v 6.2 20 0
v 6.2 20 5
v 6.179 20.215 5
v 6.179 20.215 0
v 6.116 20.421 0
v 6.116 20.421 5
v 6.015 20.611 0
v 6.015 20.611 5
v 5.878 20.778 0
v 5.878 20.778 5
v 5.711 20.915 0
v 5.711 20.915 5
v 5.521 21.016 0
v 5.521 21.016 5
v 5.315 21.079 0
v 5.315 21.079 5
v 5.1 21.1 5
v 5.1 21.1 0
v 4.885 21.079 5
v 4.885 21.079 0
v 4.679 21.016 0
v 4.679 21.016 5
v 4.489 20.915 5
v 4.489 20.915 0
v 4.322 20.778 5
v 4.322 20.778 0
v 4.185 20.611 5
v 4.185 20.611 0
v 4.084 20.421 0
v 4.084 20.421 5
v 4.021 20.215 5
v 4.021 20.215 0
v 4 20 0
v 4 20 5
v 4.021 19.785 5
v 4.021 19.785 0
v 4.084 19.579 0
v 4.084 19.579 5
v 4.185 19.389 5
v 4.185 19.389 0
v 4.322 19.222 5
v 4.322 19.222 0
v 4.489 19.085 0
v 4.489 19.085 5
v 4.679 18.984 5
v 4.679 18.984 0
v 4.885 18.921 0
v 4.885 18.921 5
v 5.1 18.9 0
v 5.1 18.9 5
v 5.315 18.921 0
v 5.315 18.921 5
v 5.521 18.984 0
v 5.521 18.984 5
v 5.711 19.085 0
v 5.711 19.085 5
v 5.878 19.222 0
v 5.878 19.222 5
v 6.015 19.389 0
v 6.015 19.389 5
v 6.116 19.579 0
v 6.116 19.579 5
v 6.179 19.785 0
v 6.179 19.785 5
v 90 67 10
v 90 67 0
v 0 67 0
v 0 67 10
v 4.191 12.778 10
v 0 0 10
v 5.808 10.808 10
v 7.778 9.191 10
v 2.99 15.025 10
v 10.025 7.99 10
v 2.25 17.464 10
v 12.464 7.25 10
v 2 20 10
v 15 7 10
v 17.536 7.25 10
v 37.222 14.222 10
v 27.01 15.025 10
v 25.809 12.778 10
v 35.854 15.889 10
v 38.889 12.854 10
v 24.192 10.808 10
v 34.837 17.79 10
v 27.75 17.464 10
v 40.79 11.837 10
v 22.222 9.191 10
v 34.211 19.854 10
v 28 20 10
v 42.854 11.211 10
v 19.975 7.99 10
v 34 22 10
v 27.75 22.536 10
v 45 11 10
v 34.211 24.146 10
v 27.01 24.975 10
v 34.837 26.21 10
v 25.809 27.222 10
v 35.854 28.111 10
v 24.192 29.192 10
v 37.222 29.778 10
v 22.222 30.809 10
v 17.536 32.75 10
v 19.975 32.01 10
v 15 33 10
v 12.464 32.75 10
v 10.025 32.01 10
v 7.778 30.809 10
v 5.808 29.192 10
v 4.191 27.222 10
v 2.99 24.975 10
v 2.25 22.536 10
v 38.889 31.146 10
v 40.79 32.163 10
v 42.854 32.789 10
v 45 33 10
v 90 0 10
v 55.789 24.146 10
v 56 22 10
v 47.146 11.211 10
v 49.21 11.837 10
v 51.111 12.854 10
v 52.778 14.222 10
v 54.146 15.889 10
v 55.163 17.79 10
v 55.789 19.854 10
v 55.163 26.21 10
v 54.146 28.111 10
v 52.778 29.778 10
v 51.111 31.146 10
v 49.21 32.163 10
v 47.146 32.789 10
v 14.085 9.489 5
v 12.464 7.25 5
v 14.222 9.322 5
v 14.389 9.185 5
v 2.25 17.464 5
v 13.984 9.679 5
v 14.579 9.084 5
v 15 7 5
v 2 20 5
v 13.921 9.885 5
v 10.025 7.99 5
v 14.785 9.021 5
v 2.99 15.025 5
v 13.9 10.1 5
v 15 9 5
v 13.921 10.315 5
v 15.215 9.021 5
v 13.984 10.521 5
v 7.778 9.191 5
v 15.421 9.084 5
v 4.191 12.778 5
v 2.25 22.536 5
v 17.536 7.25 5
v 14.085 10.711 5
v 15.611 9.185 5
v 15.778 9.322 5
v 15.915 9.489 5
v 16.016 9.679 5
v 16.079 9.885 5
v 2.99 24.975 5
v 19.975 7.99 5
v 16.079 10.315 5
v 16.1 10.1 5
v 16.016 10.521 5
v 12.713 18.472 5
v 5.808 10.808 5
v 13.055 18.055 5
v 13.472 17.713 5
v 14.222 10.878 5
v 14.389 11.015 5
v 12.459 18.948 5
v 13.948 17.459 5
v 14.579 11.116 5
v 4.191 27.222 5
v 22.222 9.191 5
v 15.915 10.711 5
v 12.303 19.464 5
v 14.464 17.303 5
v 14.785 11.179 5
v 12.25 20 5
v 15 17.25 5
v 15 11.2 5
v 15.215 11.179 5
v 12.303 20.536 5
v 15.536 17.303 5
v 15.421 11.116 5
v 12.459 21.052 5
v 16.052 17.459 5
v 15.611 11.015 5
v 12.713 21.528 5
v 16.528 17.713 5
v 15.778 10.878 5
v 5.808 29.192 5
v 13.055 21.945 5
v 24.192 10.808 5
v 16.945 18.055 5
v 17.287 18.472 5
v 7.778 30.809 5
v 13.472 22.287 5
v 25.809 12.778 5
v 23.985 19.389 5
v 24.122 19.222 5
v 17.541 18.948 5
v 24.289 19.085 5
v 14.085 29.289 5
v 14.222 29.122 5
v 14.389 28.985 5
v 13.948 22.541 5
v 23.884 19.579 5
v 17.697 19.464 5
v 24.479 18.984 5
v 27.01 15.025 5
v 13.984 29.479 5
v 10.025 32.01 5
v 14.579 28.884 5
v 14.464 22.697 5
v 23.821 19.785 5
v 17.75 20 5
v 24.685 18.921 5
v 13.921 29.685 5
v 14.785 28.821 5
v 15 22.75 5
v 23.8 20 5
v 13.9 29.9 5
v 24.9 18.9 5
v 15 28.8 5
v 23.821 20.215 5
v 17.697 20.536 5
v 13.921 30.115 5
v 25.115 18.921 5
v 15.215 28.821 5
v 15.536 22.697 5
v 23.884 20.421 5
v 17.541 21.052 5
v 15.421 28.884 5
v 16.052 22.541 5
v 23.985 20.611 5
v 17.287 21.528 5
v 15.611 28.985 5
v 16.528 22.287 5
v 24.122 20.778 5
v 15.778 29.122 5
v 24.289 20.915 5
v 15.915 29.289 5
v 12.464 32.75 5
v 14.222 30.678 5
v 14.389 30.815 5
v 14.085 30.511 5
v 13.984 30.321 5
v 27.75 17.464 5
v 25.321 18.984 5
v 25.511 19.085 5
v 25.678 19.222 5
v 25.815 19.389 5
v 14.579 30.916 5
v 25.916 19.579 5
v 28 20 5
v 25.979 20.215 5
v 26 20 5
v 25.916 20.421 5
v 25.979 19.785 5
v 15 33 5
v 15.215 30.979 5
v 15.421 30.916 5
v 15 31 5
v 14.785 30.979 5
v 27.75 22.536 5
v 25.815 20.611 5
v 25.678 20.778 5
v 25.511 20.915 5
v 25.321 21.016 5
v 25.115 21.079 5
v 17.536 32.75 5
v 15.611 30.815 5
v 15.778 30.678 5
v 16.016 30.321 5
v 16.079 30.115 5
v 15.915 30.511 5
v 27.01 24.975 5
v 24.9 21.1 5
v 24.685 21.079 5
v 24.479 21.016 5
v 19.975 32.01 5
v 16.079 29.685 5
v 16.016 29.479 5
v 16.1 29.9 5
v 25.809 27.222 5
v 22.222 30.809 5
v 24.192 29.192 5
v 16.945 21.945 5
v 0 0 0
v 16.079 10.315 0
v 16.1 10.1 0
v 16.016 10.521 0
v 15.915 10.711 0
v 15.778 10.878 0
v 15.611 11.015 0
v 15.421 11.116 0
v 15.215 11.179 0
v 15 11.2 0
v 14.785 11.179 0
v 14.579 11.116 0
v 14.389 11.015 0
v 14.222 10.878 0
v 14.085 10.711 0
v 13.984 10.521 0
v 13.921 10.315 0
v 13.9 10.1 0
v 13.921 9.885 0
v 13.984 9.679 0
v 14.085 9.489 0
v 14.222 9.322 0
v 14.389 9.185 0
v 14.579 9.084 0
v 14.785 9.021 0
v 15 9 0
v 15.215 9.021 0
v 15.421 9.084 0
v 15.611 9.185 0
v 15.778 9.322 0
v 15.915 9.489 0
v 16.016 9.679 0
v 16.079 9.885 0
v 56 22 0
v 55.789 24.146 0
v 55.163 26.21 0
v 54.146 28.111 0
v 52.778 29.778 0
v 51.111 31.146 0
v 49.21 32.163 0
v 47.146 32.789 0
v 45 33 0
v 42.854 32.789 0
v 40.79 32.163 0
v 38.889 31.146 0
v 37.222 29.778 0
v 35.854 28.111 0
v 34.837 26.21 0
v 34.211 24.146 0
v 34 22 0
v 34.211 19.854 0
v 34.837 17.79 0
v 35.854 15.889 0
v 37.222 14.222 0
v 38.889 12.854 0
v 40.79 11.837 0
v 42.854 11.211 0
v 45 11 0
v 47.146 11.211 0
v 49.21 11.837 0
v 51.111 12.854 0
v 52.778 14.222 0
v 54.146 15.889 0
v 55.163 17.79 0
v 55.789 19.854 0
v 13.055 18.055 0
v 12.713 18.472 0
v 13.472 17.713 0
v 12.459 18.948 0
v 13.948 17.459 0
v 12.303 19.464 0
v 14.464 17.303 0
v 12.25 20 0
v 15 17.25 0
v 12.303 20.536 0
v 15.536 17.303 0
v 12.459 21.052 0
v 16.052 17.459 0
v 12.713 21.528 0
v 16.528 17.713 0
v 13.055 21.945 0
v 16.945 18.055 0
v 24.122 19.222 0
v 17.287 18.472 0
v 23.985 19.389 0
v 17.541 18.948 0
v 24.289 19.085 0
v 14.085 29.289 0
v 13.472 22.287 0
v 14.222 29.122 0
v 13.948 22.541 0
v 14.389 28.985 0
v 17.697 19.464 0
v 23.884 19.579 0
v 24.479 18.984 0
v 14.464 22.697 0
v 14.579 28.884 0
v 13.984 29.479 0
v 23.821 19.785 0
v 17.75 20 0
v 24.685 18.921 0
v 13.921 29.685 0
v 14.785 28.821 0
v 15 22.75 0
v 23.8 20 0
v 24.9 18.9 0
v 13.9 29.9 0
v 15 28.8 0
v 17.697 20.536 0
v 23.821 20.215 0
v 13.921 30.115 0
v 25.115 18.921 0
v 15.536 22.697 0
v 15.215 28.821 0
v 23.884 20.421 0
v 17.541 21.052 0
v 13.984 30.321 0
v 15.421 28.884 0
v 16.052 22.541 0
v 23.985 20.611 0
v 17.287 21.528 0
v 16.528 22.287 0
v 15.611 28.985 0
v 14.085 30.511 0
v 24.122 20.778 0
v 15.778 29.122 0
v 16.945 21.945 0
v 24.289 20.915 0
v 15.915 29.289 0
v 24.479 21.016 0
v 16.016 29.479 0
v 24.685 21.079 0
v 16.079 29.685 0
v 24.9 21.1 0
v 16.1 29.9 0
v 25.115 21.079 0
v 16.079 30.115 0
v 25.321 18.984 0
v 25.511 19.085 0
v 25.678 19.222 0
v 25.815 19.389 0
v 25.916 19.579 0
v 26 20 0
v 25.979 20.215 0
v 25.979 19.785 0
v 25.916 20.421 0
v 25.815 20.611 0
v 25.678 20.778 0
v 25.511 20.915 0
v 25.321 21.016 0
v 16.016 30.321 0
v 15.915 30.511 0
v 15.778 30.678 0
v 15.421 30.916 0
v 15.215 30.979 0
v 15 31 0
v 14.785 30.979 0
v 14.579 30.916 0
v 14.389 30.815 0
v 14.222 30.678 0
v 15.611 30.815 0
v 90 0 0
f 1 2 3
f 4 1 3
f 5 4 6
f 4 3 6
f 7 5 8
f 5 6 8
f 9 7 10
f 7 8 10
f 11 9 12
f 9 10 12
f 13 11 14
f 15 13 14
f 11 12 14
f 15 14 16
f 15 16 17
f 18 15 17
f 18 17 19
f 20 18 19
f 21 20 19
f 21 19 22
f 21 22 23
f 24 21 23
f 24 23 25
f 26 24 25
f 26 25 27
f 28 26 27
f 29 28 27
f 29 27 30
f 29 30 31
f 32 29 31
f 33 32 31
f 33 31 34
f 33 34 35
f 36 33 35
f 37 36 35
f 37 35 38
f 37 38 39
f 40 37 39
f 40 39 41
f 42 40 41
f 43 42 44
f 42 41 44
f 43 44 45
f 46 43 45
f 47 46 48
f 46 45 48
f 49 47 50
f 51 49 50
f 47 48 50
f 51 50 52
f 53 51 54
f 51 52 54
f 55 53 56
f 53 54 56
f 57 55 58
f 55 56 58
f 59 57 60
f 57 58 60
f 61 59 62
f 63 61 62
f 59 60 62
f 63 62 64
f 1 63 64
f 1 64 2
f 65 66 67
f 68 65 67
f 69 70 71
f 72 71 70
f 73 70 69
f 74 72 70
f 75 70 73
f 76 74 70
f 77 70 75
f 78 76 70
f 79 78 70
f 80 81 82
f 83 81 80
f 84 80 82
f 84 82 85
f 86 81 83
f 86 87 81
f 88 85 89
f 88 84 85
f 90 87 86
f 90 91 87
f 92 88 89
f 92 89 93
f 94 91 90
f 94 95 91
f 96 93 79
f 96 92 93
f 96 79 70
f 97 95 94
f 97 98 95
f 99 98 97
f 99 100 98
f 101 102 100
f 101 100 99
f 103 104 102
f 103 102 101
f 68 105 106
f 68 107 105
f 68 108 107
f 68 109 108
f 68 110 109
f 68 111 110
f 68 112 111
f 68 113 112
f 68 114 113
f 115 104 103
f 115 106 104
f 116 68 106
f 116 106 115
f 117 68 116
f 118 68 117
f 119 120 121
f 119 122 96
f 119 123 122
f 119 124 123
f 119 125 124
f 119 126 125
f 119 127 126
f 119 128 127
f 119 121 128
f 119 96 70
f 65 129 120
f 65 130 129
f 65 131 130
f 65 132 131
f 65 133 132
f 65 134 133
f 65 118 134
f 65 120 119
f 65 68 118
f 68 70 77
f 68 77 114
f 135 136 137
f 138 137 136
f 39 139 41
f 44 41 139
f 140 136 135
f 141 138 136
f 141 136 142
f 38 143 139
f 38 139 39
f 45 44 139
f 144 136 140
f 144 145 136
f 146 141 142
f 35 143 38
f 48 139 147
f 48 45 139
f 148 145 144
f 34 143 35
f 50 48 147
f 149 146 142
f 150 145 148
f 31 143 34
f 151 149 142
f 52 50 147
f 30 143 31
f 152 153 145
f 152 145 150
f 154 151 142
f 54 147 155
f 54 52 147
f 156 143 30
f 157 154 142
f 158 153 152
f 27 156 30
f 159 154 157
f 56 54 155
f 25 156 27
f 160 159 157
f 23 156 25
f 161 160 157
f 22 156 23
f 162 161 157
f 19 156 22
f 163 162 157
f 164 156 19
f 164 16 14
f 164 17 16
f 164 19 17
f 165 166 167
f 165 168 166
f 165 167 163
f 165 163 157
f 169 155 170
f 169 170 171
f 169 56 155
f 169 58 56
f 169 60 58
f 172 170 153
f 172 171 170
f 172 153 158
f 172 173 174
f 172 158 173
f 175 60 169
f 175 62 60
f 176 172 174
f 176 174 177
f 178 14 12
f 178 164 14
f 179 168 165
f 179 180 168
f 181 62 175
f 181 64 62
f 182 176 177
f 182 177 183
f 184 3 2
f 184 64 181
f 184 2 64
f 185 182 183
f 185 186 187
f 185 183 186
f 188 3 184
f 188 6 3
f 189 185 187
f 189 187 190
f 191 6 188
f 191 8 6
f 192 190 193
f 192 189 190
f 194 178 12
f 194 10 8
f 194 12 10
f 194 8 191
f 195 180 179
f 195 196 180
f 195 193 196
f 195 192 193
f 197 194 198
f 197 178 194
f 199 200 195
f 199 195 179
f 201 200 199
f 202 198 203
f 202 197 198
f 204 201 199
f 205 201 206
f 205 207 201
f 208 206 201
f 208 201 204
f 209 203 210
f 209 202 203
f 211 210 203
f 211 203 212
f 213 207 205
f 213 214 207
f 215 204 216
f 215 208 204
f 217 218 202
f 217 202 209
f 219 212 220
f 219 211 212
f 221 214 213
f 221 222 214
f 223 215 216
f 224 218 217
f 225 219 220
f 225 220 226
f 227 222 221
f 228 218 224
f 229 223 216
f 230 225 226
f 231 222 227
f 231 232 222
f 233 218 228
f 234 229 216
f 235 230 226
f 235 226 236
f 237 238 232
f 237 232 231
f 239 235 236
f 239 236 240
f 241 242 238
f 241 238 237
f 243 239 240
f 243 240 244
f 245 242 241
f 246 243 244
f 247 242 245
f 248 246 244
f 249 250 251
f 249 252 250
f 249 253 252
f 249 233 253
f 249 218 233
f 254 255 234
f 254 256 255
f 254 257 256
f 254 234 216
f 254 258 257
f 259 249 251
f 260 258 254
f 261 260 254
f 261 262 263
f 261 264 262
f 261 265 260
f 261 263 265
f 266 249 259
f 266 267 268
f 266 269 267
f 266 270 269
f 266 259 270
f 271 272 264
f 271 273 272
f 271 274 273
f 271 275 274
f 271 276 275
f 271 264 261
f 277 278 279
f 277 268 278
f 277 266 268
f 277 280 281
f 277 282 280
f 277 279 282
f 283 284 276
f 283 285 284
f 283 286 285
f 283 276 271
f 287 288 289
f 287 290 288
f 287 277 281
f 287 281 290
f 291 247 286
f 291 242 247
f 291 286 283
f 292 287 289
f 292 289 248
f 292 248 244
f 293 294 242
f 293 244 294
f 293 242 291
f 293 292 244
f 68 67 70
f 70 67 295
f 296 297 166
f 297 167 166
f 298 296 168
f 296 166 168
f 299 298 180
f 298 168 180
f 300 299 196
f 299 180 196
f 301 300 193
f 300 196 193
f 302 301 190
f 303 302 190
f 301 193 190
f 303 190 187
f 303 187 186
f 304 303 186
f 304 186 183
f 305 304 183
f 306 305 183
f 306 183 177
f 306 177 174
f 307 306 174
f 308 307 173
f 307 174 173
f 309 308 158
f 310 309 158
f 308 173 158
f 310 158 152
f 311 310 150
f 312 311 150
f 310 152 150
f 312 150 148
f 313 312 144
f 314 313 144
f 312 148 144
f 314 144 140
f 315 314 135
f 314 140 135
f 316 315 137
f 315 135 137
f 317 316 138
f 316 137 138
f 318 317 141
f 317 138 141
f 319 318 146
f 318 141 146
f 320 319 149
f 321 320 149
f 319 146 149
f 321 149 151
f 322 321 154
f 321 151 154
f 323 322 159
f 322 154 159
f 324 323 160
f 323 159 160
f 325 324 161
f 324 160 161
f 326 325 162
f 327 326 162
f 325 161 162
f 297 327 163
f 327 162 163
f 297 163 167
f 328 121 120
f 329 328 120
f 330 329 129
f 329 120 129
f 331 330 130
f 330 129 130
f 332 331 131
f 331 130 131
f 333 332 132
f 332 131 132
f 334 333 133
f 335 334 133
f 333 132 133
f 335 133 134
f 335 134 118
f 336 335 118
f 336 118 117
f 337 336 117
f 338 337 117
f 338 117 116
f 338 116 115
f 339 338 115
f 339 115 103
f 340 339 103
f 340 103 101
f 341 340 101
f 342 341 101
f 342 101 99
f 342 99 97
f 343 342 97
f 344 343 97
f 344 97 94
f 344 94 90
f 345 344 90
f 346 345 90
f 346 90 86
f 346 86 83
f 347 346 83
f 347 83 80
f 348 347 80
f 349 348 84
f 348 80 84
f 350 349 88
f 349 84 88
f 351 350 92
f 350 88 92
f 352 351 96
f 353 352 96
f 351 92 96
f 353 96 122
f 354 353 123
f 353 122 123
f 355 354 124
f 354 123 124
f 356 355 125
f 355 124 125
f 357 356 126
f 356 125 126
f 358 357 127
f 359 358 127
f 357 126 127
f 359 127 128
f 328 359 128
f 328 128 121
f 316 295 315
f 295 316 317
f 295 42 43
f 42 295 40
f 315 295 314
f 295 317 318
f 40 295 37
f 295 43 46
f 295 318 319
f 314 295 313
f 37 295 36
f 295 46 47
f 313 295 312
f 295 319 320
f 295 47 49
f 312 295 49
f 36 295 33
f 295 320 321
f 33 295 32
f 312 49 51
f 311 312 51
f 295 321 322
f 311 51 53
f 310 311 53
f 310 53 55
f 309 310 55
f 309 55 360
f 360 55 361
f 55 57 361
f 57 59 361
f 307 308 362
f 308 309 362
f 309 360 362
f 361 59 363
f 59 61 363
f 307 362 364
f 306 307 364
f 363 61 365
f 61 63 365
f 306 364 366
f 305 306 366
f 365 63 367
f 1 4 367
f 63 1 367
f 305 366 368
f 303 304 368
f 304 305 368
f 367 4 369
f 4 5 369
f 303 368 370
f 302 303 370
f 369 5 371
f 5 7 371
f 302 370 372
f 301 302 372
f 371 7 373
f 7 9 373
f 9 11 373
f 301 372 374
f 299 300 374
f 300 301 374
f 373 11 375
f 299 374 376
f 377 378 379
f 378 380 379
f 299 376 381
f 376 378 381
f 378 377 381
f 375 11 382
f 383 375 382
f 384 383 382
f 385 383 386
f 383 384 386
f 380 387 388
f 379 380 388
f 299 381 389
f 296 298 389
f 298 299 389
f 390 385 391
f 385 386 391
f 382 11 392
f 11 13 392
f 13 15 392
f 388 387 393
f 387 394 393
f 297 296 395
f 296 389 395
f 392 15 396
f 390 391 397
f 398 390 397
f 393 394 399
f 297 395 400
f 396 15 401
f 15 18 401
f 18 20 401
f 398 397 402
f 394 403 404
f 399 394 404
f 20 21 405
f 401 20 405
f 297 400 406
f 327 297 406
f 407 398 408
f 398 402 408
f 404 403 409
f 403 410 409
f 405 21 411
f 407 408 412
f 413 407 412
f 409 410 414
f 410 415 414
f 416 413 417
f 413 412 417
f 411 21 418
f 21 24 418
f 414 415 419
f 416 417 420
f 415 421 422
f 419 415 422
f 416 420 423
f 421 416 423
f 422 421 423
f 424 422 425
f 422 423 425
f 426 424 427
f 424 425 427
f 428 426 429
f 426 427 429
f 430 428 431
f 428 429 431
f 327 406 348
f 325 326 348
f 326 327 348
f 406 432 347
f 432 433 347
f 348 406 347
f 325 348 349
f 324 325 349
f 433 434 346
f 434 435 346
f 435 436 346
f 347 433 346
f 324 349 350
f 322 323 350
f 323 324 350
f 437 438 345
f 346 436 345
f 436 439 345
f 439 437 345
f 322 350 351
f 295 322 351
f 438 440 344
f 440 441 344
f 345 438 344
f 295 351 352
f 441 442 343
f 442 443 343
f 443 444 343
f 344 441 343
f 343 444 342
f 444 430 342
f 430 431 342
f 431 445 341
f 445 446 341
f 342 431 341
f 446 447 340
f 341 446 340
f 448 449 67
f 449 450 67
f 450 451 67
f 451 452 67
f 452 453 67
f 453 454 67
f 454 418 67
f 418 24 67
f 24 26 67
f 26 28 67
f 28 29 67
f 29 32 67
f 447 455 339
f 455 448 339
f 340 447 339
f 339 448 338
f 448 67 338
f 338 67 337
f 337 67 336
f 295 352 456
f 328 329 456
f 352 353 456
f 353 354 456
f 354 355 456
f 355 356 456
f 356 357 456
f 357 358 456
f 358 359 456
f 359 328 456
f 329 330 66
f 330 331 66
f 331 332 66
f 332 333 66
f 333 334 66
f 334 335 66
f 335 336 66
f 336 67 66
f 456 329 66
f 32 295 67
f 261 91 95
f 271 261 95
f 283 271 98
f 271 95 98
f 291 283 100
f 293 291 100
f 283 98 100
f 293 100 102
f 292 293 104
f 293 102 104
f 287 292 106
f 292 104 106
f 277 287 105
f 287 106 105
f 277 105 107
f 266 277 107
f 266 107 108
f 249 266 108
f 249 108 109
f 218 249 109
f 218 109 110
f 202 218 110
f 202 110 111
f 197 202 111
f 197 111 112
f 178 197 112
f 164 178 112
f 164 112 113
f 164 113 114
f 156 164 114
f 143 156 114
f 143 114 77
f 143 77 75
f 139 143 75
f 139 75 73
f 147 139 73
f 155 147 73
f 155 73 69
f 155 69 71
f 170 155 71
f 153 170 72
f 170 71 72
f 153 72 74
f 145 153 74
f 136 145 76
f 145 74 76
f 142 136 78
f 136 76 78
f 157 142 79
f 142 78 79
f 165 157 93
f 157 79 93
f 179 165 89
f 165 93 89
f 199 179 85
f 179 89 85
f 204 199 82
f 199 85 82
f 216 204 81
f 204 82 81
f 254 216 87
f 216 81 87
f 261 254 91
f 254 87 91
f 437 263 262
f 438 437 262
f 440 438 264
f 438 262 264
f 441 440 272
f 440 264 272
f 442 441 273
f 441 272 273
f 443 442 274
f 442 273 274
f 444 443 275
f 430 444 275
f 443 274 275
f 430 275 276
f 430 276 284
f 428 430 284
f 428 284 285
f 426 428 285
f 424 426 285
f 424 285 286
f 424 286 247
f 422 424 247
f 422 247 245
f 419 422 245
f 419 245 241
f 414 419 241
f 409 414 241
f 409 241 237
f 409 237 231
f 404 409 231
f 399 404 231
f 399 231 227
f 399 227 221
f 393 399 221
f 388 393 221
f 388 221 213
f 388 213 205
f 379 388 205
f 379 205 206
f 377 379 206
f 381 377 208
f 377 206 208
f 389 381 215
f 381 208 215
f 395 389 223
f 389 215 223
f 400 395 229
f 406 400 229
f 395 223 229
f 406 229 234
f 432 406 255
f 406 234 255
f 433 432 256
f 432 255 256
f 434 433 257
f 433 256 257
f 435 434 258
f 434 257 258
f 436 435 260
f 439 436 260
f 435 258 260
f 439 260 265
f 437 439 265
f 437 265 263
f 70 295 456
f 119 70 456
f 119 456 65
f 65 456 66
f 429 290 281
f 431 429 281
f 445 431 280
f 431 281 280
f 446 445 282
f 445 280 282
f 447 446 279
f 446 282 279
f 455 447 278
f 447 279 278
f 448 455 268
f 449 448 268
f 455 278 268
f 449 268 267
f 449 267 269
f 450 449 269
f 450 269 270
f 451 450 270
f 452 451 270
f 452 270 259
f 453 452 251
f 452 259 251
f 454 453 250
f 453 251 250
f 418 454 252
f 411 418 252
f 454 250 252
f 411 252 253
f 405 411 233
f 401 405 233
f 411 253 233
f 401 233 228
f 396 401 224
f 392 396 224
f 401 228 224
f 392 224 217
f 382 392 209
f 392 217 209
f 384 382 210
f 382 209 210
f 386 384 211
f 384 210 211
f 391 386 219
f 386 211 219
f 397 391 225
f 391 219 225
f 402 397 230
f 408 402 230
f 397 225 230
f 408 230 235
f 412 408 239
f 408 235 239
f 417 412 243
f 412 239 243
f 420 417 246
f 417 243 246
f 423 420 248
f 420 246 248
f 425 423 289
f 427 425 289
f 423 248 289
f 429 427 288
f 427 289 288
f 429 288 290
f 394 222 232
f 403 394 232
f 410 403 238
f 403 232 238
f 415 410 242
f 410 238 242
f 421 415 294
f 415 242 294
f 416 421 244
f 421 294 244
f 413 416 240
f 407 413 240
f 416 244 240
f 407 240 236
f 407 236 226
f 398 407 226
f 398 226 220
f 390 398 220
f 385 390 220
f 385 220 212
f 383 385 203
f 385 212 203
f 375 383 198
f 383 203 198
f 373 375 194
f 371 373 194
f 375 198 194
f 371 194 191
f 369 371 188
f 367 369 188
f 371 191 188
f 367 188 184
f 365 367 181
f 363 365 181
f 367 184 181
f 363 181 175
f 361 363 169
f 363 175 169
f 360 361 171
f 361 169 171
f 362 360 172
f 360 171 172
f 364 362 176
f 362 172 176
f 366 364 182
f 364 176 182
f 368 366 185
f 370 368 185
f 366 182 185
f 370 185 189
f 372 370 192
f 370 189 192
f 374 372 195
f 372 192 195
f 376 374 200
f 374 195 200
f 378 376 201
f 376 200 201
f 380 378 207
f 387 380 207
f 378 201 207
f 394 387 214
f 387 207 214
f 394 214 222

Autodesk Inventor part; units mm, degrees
ref_plane "YZ Plane" through (0, 0, 0) normal (1, 0, 0) x (0, 1, 0)
ref_plane "XZ Plane" through (0, 0, 0) normal (0, 1, 0) x (-1, 0, 0)
ref_plane "XY Plane" through (0, 0, 0) normal (0, 0, 1) x (1, 0, 0)
sketch "Esquisse1" plane through (0, 0, 0) normal (0, 0, 1) x (1, 0, 0)
  line L0 (0, 0) -> (90, 0)
  line L1 (90, 0) -> (90, 67)
  line L2 (90, 67) -> (0, 67)
  line L3 (0, 67) -> (0, 0)
  dimension "d0" = 90
  dimension "d1" = 67
extrude "Extrusion1" add sketch "Esquisse1" along normal blind 10
sketch "Esquisse2" plane through (0, 0, 10) normal (0, 0, 1) x (1, 0, 0)
  circle A0 centre (15, 20) radius 13
  line L0 (0, 0) -> (90, 0) projected
  line L1 (0, 67) -> (0, 0) projected
  circle A1 centre (75, 15) radius 13
  line L2 (90, 0) -> (90, 67) projected
  circle A2 centre (15, 29.9) radius 1.1
  circle A3 centre (5.1, 20) radius 1.1
  circle A4 centre (15, 10.1) radius 1.1
  circle A5 centre (24.9, 20) radius 1.1
  circle A6 centre (15, 20) radius 2.75
  dimension "d4" = 26
  dimension "d5" = 20
  dimension "d6" = 15
  dimension "d7" = 26
  dimension "d8" = 15
  dimension "d9" = 15
  dimension "d10" = 2.2
  dimension "d11" = 2
  dimension "d12" = 15
  dimension "d15" = 360
  dimension "d17" = 5.5
extrude "Extrusion2" cut sketch "Esquisse2" against normal blind 10 contours A2 | A3 | A4 | A5 | A6
sketch "Esquisse3" plane through (0, 0, 10) normal (0, 0, 1) x (1, 0, 0)
  circle A0 centre (45, 22) radius 11
  line L0 (0, 0) -> (90, 0) projected
  line L1 (90, 0) -> (90, 67) projected
  dimension "d20" = 22
  dimension "d21" = 45
  dimension "d22" = 22
extrude "Extrusion3" cut sketch "Esquisse3" against normal blind 10
sketch "Esquisse4" plane through (0, 0, 10) normal (0, 0, 1) x (1, 0, 0)
  circle A0 centre (15, 20) radius 2.75 projected
  circle A1 centre (15, 20) radius 13
  point P0 (0, 0)
  dimension "d25" = 26
extrude "Extrusion4" cut sketch "Esquisse4" against normal blind 5
properties part number "Flancs"
